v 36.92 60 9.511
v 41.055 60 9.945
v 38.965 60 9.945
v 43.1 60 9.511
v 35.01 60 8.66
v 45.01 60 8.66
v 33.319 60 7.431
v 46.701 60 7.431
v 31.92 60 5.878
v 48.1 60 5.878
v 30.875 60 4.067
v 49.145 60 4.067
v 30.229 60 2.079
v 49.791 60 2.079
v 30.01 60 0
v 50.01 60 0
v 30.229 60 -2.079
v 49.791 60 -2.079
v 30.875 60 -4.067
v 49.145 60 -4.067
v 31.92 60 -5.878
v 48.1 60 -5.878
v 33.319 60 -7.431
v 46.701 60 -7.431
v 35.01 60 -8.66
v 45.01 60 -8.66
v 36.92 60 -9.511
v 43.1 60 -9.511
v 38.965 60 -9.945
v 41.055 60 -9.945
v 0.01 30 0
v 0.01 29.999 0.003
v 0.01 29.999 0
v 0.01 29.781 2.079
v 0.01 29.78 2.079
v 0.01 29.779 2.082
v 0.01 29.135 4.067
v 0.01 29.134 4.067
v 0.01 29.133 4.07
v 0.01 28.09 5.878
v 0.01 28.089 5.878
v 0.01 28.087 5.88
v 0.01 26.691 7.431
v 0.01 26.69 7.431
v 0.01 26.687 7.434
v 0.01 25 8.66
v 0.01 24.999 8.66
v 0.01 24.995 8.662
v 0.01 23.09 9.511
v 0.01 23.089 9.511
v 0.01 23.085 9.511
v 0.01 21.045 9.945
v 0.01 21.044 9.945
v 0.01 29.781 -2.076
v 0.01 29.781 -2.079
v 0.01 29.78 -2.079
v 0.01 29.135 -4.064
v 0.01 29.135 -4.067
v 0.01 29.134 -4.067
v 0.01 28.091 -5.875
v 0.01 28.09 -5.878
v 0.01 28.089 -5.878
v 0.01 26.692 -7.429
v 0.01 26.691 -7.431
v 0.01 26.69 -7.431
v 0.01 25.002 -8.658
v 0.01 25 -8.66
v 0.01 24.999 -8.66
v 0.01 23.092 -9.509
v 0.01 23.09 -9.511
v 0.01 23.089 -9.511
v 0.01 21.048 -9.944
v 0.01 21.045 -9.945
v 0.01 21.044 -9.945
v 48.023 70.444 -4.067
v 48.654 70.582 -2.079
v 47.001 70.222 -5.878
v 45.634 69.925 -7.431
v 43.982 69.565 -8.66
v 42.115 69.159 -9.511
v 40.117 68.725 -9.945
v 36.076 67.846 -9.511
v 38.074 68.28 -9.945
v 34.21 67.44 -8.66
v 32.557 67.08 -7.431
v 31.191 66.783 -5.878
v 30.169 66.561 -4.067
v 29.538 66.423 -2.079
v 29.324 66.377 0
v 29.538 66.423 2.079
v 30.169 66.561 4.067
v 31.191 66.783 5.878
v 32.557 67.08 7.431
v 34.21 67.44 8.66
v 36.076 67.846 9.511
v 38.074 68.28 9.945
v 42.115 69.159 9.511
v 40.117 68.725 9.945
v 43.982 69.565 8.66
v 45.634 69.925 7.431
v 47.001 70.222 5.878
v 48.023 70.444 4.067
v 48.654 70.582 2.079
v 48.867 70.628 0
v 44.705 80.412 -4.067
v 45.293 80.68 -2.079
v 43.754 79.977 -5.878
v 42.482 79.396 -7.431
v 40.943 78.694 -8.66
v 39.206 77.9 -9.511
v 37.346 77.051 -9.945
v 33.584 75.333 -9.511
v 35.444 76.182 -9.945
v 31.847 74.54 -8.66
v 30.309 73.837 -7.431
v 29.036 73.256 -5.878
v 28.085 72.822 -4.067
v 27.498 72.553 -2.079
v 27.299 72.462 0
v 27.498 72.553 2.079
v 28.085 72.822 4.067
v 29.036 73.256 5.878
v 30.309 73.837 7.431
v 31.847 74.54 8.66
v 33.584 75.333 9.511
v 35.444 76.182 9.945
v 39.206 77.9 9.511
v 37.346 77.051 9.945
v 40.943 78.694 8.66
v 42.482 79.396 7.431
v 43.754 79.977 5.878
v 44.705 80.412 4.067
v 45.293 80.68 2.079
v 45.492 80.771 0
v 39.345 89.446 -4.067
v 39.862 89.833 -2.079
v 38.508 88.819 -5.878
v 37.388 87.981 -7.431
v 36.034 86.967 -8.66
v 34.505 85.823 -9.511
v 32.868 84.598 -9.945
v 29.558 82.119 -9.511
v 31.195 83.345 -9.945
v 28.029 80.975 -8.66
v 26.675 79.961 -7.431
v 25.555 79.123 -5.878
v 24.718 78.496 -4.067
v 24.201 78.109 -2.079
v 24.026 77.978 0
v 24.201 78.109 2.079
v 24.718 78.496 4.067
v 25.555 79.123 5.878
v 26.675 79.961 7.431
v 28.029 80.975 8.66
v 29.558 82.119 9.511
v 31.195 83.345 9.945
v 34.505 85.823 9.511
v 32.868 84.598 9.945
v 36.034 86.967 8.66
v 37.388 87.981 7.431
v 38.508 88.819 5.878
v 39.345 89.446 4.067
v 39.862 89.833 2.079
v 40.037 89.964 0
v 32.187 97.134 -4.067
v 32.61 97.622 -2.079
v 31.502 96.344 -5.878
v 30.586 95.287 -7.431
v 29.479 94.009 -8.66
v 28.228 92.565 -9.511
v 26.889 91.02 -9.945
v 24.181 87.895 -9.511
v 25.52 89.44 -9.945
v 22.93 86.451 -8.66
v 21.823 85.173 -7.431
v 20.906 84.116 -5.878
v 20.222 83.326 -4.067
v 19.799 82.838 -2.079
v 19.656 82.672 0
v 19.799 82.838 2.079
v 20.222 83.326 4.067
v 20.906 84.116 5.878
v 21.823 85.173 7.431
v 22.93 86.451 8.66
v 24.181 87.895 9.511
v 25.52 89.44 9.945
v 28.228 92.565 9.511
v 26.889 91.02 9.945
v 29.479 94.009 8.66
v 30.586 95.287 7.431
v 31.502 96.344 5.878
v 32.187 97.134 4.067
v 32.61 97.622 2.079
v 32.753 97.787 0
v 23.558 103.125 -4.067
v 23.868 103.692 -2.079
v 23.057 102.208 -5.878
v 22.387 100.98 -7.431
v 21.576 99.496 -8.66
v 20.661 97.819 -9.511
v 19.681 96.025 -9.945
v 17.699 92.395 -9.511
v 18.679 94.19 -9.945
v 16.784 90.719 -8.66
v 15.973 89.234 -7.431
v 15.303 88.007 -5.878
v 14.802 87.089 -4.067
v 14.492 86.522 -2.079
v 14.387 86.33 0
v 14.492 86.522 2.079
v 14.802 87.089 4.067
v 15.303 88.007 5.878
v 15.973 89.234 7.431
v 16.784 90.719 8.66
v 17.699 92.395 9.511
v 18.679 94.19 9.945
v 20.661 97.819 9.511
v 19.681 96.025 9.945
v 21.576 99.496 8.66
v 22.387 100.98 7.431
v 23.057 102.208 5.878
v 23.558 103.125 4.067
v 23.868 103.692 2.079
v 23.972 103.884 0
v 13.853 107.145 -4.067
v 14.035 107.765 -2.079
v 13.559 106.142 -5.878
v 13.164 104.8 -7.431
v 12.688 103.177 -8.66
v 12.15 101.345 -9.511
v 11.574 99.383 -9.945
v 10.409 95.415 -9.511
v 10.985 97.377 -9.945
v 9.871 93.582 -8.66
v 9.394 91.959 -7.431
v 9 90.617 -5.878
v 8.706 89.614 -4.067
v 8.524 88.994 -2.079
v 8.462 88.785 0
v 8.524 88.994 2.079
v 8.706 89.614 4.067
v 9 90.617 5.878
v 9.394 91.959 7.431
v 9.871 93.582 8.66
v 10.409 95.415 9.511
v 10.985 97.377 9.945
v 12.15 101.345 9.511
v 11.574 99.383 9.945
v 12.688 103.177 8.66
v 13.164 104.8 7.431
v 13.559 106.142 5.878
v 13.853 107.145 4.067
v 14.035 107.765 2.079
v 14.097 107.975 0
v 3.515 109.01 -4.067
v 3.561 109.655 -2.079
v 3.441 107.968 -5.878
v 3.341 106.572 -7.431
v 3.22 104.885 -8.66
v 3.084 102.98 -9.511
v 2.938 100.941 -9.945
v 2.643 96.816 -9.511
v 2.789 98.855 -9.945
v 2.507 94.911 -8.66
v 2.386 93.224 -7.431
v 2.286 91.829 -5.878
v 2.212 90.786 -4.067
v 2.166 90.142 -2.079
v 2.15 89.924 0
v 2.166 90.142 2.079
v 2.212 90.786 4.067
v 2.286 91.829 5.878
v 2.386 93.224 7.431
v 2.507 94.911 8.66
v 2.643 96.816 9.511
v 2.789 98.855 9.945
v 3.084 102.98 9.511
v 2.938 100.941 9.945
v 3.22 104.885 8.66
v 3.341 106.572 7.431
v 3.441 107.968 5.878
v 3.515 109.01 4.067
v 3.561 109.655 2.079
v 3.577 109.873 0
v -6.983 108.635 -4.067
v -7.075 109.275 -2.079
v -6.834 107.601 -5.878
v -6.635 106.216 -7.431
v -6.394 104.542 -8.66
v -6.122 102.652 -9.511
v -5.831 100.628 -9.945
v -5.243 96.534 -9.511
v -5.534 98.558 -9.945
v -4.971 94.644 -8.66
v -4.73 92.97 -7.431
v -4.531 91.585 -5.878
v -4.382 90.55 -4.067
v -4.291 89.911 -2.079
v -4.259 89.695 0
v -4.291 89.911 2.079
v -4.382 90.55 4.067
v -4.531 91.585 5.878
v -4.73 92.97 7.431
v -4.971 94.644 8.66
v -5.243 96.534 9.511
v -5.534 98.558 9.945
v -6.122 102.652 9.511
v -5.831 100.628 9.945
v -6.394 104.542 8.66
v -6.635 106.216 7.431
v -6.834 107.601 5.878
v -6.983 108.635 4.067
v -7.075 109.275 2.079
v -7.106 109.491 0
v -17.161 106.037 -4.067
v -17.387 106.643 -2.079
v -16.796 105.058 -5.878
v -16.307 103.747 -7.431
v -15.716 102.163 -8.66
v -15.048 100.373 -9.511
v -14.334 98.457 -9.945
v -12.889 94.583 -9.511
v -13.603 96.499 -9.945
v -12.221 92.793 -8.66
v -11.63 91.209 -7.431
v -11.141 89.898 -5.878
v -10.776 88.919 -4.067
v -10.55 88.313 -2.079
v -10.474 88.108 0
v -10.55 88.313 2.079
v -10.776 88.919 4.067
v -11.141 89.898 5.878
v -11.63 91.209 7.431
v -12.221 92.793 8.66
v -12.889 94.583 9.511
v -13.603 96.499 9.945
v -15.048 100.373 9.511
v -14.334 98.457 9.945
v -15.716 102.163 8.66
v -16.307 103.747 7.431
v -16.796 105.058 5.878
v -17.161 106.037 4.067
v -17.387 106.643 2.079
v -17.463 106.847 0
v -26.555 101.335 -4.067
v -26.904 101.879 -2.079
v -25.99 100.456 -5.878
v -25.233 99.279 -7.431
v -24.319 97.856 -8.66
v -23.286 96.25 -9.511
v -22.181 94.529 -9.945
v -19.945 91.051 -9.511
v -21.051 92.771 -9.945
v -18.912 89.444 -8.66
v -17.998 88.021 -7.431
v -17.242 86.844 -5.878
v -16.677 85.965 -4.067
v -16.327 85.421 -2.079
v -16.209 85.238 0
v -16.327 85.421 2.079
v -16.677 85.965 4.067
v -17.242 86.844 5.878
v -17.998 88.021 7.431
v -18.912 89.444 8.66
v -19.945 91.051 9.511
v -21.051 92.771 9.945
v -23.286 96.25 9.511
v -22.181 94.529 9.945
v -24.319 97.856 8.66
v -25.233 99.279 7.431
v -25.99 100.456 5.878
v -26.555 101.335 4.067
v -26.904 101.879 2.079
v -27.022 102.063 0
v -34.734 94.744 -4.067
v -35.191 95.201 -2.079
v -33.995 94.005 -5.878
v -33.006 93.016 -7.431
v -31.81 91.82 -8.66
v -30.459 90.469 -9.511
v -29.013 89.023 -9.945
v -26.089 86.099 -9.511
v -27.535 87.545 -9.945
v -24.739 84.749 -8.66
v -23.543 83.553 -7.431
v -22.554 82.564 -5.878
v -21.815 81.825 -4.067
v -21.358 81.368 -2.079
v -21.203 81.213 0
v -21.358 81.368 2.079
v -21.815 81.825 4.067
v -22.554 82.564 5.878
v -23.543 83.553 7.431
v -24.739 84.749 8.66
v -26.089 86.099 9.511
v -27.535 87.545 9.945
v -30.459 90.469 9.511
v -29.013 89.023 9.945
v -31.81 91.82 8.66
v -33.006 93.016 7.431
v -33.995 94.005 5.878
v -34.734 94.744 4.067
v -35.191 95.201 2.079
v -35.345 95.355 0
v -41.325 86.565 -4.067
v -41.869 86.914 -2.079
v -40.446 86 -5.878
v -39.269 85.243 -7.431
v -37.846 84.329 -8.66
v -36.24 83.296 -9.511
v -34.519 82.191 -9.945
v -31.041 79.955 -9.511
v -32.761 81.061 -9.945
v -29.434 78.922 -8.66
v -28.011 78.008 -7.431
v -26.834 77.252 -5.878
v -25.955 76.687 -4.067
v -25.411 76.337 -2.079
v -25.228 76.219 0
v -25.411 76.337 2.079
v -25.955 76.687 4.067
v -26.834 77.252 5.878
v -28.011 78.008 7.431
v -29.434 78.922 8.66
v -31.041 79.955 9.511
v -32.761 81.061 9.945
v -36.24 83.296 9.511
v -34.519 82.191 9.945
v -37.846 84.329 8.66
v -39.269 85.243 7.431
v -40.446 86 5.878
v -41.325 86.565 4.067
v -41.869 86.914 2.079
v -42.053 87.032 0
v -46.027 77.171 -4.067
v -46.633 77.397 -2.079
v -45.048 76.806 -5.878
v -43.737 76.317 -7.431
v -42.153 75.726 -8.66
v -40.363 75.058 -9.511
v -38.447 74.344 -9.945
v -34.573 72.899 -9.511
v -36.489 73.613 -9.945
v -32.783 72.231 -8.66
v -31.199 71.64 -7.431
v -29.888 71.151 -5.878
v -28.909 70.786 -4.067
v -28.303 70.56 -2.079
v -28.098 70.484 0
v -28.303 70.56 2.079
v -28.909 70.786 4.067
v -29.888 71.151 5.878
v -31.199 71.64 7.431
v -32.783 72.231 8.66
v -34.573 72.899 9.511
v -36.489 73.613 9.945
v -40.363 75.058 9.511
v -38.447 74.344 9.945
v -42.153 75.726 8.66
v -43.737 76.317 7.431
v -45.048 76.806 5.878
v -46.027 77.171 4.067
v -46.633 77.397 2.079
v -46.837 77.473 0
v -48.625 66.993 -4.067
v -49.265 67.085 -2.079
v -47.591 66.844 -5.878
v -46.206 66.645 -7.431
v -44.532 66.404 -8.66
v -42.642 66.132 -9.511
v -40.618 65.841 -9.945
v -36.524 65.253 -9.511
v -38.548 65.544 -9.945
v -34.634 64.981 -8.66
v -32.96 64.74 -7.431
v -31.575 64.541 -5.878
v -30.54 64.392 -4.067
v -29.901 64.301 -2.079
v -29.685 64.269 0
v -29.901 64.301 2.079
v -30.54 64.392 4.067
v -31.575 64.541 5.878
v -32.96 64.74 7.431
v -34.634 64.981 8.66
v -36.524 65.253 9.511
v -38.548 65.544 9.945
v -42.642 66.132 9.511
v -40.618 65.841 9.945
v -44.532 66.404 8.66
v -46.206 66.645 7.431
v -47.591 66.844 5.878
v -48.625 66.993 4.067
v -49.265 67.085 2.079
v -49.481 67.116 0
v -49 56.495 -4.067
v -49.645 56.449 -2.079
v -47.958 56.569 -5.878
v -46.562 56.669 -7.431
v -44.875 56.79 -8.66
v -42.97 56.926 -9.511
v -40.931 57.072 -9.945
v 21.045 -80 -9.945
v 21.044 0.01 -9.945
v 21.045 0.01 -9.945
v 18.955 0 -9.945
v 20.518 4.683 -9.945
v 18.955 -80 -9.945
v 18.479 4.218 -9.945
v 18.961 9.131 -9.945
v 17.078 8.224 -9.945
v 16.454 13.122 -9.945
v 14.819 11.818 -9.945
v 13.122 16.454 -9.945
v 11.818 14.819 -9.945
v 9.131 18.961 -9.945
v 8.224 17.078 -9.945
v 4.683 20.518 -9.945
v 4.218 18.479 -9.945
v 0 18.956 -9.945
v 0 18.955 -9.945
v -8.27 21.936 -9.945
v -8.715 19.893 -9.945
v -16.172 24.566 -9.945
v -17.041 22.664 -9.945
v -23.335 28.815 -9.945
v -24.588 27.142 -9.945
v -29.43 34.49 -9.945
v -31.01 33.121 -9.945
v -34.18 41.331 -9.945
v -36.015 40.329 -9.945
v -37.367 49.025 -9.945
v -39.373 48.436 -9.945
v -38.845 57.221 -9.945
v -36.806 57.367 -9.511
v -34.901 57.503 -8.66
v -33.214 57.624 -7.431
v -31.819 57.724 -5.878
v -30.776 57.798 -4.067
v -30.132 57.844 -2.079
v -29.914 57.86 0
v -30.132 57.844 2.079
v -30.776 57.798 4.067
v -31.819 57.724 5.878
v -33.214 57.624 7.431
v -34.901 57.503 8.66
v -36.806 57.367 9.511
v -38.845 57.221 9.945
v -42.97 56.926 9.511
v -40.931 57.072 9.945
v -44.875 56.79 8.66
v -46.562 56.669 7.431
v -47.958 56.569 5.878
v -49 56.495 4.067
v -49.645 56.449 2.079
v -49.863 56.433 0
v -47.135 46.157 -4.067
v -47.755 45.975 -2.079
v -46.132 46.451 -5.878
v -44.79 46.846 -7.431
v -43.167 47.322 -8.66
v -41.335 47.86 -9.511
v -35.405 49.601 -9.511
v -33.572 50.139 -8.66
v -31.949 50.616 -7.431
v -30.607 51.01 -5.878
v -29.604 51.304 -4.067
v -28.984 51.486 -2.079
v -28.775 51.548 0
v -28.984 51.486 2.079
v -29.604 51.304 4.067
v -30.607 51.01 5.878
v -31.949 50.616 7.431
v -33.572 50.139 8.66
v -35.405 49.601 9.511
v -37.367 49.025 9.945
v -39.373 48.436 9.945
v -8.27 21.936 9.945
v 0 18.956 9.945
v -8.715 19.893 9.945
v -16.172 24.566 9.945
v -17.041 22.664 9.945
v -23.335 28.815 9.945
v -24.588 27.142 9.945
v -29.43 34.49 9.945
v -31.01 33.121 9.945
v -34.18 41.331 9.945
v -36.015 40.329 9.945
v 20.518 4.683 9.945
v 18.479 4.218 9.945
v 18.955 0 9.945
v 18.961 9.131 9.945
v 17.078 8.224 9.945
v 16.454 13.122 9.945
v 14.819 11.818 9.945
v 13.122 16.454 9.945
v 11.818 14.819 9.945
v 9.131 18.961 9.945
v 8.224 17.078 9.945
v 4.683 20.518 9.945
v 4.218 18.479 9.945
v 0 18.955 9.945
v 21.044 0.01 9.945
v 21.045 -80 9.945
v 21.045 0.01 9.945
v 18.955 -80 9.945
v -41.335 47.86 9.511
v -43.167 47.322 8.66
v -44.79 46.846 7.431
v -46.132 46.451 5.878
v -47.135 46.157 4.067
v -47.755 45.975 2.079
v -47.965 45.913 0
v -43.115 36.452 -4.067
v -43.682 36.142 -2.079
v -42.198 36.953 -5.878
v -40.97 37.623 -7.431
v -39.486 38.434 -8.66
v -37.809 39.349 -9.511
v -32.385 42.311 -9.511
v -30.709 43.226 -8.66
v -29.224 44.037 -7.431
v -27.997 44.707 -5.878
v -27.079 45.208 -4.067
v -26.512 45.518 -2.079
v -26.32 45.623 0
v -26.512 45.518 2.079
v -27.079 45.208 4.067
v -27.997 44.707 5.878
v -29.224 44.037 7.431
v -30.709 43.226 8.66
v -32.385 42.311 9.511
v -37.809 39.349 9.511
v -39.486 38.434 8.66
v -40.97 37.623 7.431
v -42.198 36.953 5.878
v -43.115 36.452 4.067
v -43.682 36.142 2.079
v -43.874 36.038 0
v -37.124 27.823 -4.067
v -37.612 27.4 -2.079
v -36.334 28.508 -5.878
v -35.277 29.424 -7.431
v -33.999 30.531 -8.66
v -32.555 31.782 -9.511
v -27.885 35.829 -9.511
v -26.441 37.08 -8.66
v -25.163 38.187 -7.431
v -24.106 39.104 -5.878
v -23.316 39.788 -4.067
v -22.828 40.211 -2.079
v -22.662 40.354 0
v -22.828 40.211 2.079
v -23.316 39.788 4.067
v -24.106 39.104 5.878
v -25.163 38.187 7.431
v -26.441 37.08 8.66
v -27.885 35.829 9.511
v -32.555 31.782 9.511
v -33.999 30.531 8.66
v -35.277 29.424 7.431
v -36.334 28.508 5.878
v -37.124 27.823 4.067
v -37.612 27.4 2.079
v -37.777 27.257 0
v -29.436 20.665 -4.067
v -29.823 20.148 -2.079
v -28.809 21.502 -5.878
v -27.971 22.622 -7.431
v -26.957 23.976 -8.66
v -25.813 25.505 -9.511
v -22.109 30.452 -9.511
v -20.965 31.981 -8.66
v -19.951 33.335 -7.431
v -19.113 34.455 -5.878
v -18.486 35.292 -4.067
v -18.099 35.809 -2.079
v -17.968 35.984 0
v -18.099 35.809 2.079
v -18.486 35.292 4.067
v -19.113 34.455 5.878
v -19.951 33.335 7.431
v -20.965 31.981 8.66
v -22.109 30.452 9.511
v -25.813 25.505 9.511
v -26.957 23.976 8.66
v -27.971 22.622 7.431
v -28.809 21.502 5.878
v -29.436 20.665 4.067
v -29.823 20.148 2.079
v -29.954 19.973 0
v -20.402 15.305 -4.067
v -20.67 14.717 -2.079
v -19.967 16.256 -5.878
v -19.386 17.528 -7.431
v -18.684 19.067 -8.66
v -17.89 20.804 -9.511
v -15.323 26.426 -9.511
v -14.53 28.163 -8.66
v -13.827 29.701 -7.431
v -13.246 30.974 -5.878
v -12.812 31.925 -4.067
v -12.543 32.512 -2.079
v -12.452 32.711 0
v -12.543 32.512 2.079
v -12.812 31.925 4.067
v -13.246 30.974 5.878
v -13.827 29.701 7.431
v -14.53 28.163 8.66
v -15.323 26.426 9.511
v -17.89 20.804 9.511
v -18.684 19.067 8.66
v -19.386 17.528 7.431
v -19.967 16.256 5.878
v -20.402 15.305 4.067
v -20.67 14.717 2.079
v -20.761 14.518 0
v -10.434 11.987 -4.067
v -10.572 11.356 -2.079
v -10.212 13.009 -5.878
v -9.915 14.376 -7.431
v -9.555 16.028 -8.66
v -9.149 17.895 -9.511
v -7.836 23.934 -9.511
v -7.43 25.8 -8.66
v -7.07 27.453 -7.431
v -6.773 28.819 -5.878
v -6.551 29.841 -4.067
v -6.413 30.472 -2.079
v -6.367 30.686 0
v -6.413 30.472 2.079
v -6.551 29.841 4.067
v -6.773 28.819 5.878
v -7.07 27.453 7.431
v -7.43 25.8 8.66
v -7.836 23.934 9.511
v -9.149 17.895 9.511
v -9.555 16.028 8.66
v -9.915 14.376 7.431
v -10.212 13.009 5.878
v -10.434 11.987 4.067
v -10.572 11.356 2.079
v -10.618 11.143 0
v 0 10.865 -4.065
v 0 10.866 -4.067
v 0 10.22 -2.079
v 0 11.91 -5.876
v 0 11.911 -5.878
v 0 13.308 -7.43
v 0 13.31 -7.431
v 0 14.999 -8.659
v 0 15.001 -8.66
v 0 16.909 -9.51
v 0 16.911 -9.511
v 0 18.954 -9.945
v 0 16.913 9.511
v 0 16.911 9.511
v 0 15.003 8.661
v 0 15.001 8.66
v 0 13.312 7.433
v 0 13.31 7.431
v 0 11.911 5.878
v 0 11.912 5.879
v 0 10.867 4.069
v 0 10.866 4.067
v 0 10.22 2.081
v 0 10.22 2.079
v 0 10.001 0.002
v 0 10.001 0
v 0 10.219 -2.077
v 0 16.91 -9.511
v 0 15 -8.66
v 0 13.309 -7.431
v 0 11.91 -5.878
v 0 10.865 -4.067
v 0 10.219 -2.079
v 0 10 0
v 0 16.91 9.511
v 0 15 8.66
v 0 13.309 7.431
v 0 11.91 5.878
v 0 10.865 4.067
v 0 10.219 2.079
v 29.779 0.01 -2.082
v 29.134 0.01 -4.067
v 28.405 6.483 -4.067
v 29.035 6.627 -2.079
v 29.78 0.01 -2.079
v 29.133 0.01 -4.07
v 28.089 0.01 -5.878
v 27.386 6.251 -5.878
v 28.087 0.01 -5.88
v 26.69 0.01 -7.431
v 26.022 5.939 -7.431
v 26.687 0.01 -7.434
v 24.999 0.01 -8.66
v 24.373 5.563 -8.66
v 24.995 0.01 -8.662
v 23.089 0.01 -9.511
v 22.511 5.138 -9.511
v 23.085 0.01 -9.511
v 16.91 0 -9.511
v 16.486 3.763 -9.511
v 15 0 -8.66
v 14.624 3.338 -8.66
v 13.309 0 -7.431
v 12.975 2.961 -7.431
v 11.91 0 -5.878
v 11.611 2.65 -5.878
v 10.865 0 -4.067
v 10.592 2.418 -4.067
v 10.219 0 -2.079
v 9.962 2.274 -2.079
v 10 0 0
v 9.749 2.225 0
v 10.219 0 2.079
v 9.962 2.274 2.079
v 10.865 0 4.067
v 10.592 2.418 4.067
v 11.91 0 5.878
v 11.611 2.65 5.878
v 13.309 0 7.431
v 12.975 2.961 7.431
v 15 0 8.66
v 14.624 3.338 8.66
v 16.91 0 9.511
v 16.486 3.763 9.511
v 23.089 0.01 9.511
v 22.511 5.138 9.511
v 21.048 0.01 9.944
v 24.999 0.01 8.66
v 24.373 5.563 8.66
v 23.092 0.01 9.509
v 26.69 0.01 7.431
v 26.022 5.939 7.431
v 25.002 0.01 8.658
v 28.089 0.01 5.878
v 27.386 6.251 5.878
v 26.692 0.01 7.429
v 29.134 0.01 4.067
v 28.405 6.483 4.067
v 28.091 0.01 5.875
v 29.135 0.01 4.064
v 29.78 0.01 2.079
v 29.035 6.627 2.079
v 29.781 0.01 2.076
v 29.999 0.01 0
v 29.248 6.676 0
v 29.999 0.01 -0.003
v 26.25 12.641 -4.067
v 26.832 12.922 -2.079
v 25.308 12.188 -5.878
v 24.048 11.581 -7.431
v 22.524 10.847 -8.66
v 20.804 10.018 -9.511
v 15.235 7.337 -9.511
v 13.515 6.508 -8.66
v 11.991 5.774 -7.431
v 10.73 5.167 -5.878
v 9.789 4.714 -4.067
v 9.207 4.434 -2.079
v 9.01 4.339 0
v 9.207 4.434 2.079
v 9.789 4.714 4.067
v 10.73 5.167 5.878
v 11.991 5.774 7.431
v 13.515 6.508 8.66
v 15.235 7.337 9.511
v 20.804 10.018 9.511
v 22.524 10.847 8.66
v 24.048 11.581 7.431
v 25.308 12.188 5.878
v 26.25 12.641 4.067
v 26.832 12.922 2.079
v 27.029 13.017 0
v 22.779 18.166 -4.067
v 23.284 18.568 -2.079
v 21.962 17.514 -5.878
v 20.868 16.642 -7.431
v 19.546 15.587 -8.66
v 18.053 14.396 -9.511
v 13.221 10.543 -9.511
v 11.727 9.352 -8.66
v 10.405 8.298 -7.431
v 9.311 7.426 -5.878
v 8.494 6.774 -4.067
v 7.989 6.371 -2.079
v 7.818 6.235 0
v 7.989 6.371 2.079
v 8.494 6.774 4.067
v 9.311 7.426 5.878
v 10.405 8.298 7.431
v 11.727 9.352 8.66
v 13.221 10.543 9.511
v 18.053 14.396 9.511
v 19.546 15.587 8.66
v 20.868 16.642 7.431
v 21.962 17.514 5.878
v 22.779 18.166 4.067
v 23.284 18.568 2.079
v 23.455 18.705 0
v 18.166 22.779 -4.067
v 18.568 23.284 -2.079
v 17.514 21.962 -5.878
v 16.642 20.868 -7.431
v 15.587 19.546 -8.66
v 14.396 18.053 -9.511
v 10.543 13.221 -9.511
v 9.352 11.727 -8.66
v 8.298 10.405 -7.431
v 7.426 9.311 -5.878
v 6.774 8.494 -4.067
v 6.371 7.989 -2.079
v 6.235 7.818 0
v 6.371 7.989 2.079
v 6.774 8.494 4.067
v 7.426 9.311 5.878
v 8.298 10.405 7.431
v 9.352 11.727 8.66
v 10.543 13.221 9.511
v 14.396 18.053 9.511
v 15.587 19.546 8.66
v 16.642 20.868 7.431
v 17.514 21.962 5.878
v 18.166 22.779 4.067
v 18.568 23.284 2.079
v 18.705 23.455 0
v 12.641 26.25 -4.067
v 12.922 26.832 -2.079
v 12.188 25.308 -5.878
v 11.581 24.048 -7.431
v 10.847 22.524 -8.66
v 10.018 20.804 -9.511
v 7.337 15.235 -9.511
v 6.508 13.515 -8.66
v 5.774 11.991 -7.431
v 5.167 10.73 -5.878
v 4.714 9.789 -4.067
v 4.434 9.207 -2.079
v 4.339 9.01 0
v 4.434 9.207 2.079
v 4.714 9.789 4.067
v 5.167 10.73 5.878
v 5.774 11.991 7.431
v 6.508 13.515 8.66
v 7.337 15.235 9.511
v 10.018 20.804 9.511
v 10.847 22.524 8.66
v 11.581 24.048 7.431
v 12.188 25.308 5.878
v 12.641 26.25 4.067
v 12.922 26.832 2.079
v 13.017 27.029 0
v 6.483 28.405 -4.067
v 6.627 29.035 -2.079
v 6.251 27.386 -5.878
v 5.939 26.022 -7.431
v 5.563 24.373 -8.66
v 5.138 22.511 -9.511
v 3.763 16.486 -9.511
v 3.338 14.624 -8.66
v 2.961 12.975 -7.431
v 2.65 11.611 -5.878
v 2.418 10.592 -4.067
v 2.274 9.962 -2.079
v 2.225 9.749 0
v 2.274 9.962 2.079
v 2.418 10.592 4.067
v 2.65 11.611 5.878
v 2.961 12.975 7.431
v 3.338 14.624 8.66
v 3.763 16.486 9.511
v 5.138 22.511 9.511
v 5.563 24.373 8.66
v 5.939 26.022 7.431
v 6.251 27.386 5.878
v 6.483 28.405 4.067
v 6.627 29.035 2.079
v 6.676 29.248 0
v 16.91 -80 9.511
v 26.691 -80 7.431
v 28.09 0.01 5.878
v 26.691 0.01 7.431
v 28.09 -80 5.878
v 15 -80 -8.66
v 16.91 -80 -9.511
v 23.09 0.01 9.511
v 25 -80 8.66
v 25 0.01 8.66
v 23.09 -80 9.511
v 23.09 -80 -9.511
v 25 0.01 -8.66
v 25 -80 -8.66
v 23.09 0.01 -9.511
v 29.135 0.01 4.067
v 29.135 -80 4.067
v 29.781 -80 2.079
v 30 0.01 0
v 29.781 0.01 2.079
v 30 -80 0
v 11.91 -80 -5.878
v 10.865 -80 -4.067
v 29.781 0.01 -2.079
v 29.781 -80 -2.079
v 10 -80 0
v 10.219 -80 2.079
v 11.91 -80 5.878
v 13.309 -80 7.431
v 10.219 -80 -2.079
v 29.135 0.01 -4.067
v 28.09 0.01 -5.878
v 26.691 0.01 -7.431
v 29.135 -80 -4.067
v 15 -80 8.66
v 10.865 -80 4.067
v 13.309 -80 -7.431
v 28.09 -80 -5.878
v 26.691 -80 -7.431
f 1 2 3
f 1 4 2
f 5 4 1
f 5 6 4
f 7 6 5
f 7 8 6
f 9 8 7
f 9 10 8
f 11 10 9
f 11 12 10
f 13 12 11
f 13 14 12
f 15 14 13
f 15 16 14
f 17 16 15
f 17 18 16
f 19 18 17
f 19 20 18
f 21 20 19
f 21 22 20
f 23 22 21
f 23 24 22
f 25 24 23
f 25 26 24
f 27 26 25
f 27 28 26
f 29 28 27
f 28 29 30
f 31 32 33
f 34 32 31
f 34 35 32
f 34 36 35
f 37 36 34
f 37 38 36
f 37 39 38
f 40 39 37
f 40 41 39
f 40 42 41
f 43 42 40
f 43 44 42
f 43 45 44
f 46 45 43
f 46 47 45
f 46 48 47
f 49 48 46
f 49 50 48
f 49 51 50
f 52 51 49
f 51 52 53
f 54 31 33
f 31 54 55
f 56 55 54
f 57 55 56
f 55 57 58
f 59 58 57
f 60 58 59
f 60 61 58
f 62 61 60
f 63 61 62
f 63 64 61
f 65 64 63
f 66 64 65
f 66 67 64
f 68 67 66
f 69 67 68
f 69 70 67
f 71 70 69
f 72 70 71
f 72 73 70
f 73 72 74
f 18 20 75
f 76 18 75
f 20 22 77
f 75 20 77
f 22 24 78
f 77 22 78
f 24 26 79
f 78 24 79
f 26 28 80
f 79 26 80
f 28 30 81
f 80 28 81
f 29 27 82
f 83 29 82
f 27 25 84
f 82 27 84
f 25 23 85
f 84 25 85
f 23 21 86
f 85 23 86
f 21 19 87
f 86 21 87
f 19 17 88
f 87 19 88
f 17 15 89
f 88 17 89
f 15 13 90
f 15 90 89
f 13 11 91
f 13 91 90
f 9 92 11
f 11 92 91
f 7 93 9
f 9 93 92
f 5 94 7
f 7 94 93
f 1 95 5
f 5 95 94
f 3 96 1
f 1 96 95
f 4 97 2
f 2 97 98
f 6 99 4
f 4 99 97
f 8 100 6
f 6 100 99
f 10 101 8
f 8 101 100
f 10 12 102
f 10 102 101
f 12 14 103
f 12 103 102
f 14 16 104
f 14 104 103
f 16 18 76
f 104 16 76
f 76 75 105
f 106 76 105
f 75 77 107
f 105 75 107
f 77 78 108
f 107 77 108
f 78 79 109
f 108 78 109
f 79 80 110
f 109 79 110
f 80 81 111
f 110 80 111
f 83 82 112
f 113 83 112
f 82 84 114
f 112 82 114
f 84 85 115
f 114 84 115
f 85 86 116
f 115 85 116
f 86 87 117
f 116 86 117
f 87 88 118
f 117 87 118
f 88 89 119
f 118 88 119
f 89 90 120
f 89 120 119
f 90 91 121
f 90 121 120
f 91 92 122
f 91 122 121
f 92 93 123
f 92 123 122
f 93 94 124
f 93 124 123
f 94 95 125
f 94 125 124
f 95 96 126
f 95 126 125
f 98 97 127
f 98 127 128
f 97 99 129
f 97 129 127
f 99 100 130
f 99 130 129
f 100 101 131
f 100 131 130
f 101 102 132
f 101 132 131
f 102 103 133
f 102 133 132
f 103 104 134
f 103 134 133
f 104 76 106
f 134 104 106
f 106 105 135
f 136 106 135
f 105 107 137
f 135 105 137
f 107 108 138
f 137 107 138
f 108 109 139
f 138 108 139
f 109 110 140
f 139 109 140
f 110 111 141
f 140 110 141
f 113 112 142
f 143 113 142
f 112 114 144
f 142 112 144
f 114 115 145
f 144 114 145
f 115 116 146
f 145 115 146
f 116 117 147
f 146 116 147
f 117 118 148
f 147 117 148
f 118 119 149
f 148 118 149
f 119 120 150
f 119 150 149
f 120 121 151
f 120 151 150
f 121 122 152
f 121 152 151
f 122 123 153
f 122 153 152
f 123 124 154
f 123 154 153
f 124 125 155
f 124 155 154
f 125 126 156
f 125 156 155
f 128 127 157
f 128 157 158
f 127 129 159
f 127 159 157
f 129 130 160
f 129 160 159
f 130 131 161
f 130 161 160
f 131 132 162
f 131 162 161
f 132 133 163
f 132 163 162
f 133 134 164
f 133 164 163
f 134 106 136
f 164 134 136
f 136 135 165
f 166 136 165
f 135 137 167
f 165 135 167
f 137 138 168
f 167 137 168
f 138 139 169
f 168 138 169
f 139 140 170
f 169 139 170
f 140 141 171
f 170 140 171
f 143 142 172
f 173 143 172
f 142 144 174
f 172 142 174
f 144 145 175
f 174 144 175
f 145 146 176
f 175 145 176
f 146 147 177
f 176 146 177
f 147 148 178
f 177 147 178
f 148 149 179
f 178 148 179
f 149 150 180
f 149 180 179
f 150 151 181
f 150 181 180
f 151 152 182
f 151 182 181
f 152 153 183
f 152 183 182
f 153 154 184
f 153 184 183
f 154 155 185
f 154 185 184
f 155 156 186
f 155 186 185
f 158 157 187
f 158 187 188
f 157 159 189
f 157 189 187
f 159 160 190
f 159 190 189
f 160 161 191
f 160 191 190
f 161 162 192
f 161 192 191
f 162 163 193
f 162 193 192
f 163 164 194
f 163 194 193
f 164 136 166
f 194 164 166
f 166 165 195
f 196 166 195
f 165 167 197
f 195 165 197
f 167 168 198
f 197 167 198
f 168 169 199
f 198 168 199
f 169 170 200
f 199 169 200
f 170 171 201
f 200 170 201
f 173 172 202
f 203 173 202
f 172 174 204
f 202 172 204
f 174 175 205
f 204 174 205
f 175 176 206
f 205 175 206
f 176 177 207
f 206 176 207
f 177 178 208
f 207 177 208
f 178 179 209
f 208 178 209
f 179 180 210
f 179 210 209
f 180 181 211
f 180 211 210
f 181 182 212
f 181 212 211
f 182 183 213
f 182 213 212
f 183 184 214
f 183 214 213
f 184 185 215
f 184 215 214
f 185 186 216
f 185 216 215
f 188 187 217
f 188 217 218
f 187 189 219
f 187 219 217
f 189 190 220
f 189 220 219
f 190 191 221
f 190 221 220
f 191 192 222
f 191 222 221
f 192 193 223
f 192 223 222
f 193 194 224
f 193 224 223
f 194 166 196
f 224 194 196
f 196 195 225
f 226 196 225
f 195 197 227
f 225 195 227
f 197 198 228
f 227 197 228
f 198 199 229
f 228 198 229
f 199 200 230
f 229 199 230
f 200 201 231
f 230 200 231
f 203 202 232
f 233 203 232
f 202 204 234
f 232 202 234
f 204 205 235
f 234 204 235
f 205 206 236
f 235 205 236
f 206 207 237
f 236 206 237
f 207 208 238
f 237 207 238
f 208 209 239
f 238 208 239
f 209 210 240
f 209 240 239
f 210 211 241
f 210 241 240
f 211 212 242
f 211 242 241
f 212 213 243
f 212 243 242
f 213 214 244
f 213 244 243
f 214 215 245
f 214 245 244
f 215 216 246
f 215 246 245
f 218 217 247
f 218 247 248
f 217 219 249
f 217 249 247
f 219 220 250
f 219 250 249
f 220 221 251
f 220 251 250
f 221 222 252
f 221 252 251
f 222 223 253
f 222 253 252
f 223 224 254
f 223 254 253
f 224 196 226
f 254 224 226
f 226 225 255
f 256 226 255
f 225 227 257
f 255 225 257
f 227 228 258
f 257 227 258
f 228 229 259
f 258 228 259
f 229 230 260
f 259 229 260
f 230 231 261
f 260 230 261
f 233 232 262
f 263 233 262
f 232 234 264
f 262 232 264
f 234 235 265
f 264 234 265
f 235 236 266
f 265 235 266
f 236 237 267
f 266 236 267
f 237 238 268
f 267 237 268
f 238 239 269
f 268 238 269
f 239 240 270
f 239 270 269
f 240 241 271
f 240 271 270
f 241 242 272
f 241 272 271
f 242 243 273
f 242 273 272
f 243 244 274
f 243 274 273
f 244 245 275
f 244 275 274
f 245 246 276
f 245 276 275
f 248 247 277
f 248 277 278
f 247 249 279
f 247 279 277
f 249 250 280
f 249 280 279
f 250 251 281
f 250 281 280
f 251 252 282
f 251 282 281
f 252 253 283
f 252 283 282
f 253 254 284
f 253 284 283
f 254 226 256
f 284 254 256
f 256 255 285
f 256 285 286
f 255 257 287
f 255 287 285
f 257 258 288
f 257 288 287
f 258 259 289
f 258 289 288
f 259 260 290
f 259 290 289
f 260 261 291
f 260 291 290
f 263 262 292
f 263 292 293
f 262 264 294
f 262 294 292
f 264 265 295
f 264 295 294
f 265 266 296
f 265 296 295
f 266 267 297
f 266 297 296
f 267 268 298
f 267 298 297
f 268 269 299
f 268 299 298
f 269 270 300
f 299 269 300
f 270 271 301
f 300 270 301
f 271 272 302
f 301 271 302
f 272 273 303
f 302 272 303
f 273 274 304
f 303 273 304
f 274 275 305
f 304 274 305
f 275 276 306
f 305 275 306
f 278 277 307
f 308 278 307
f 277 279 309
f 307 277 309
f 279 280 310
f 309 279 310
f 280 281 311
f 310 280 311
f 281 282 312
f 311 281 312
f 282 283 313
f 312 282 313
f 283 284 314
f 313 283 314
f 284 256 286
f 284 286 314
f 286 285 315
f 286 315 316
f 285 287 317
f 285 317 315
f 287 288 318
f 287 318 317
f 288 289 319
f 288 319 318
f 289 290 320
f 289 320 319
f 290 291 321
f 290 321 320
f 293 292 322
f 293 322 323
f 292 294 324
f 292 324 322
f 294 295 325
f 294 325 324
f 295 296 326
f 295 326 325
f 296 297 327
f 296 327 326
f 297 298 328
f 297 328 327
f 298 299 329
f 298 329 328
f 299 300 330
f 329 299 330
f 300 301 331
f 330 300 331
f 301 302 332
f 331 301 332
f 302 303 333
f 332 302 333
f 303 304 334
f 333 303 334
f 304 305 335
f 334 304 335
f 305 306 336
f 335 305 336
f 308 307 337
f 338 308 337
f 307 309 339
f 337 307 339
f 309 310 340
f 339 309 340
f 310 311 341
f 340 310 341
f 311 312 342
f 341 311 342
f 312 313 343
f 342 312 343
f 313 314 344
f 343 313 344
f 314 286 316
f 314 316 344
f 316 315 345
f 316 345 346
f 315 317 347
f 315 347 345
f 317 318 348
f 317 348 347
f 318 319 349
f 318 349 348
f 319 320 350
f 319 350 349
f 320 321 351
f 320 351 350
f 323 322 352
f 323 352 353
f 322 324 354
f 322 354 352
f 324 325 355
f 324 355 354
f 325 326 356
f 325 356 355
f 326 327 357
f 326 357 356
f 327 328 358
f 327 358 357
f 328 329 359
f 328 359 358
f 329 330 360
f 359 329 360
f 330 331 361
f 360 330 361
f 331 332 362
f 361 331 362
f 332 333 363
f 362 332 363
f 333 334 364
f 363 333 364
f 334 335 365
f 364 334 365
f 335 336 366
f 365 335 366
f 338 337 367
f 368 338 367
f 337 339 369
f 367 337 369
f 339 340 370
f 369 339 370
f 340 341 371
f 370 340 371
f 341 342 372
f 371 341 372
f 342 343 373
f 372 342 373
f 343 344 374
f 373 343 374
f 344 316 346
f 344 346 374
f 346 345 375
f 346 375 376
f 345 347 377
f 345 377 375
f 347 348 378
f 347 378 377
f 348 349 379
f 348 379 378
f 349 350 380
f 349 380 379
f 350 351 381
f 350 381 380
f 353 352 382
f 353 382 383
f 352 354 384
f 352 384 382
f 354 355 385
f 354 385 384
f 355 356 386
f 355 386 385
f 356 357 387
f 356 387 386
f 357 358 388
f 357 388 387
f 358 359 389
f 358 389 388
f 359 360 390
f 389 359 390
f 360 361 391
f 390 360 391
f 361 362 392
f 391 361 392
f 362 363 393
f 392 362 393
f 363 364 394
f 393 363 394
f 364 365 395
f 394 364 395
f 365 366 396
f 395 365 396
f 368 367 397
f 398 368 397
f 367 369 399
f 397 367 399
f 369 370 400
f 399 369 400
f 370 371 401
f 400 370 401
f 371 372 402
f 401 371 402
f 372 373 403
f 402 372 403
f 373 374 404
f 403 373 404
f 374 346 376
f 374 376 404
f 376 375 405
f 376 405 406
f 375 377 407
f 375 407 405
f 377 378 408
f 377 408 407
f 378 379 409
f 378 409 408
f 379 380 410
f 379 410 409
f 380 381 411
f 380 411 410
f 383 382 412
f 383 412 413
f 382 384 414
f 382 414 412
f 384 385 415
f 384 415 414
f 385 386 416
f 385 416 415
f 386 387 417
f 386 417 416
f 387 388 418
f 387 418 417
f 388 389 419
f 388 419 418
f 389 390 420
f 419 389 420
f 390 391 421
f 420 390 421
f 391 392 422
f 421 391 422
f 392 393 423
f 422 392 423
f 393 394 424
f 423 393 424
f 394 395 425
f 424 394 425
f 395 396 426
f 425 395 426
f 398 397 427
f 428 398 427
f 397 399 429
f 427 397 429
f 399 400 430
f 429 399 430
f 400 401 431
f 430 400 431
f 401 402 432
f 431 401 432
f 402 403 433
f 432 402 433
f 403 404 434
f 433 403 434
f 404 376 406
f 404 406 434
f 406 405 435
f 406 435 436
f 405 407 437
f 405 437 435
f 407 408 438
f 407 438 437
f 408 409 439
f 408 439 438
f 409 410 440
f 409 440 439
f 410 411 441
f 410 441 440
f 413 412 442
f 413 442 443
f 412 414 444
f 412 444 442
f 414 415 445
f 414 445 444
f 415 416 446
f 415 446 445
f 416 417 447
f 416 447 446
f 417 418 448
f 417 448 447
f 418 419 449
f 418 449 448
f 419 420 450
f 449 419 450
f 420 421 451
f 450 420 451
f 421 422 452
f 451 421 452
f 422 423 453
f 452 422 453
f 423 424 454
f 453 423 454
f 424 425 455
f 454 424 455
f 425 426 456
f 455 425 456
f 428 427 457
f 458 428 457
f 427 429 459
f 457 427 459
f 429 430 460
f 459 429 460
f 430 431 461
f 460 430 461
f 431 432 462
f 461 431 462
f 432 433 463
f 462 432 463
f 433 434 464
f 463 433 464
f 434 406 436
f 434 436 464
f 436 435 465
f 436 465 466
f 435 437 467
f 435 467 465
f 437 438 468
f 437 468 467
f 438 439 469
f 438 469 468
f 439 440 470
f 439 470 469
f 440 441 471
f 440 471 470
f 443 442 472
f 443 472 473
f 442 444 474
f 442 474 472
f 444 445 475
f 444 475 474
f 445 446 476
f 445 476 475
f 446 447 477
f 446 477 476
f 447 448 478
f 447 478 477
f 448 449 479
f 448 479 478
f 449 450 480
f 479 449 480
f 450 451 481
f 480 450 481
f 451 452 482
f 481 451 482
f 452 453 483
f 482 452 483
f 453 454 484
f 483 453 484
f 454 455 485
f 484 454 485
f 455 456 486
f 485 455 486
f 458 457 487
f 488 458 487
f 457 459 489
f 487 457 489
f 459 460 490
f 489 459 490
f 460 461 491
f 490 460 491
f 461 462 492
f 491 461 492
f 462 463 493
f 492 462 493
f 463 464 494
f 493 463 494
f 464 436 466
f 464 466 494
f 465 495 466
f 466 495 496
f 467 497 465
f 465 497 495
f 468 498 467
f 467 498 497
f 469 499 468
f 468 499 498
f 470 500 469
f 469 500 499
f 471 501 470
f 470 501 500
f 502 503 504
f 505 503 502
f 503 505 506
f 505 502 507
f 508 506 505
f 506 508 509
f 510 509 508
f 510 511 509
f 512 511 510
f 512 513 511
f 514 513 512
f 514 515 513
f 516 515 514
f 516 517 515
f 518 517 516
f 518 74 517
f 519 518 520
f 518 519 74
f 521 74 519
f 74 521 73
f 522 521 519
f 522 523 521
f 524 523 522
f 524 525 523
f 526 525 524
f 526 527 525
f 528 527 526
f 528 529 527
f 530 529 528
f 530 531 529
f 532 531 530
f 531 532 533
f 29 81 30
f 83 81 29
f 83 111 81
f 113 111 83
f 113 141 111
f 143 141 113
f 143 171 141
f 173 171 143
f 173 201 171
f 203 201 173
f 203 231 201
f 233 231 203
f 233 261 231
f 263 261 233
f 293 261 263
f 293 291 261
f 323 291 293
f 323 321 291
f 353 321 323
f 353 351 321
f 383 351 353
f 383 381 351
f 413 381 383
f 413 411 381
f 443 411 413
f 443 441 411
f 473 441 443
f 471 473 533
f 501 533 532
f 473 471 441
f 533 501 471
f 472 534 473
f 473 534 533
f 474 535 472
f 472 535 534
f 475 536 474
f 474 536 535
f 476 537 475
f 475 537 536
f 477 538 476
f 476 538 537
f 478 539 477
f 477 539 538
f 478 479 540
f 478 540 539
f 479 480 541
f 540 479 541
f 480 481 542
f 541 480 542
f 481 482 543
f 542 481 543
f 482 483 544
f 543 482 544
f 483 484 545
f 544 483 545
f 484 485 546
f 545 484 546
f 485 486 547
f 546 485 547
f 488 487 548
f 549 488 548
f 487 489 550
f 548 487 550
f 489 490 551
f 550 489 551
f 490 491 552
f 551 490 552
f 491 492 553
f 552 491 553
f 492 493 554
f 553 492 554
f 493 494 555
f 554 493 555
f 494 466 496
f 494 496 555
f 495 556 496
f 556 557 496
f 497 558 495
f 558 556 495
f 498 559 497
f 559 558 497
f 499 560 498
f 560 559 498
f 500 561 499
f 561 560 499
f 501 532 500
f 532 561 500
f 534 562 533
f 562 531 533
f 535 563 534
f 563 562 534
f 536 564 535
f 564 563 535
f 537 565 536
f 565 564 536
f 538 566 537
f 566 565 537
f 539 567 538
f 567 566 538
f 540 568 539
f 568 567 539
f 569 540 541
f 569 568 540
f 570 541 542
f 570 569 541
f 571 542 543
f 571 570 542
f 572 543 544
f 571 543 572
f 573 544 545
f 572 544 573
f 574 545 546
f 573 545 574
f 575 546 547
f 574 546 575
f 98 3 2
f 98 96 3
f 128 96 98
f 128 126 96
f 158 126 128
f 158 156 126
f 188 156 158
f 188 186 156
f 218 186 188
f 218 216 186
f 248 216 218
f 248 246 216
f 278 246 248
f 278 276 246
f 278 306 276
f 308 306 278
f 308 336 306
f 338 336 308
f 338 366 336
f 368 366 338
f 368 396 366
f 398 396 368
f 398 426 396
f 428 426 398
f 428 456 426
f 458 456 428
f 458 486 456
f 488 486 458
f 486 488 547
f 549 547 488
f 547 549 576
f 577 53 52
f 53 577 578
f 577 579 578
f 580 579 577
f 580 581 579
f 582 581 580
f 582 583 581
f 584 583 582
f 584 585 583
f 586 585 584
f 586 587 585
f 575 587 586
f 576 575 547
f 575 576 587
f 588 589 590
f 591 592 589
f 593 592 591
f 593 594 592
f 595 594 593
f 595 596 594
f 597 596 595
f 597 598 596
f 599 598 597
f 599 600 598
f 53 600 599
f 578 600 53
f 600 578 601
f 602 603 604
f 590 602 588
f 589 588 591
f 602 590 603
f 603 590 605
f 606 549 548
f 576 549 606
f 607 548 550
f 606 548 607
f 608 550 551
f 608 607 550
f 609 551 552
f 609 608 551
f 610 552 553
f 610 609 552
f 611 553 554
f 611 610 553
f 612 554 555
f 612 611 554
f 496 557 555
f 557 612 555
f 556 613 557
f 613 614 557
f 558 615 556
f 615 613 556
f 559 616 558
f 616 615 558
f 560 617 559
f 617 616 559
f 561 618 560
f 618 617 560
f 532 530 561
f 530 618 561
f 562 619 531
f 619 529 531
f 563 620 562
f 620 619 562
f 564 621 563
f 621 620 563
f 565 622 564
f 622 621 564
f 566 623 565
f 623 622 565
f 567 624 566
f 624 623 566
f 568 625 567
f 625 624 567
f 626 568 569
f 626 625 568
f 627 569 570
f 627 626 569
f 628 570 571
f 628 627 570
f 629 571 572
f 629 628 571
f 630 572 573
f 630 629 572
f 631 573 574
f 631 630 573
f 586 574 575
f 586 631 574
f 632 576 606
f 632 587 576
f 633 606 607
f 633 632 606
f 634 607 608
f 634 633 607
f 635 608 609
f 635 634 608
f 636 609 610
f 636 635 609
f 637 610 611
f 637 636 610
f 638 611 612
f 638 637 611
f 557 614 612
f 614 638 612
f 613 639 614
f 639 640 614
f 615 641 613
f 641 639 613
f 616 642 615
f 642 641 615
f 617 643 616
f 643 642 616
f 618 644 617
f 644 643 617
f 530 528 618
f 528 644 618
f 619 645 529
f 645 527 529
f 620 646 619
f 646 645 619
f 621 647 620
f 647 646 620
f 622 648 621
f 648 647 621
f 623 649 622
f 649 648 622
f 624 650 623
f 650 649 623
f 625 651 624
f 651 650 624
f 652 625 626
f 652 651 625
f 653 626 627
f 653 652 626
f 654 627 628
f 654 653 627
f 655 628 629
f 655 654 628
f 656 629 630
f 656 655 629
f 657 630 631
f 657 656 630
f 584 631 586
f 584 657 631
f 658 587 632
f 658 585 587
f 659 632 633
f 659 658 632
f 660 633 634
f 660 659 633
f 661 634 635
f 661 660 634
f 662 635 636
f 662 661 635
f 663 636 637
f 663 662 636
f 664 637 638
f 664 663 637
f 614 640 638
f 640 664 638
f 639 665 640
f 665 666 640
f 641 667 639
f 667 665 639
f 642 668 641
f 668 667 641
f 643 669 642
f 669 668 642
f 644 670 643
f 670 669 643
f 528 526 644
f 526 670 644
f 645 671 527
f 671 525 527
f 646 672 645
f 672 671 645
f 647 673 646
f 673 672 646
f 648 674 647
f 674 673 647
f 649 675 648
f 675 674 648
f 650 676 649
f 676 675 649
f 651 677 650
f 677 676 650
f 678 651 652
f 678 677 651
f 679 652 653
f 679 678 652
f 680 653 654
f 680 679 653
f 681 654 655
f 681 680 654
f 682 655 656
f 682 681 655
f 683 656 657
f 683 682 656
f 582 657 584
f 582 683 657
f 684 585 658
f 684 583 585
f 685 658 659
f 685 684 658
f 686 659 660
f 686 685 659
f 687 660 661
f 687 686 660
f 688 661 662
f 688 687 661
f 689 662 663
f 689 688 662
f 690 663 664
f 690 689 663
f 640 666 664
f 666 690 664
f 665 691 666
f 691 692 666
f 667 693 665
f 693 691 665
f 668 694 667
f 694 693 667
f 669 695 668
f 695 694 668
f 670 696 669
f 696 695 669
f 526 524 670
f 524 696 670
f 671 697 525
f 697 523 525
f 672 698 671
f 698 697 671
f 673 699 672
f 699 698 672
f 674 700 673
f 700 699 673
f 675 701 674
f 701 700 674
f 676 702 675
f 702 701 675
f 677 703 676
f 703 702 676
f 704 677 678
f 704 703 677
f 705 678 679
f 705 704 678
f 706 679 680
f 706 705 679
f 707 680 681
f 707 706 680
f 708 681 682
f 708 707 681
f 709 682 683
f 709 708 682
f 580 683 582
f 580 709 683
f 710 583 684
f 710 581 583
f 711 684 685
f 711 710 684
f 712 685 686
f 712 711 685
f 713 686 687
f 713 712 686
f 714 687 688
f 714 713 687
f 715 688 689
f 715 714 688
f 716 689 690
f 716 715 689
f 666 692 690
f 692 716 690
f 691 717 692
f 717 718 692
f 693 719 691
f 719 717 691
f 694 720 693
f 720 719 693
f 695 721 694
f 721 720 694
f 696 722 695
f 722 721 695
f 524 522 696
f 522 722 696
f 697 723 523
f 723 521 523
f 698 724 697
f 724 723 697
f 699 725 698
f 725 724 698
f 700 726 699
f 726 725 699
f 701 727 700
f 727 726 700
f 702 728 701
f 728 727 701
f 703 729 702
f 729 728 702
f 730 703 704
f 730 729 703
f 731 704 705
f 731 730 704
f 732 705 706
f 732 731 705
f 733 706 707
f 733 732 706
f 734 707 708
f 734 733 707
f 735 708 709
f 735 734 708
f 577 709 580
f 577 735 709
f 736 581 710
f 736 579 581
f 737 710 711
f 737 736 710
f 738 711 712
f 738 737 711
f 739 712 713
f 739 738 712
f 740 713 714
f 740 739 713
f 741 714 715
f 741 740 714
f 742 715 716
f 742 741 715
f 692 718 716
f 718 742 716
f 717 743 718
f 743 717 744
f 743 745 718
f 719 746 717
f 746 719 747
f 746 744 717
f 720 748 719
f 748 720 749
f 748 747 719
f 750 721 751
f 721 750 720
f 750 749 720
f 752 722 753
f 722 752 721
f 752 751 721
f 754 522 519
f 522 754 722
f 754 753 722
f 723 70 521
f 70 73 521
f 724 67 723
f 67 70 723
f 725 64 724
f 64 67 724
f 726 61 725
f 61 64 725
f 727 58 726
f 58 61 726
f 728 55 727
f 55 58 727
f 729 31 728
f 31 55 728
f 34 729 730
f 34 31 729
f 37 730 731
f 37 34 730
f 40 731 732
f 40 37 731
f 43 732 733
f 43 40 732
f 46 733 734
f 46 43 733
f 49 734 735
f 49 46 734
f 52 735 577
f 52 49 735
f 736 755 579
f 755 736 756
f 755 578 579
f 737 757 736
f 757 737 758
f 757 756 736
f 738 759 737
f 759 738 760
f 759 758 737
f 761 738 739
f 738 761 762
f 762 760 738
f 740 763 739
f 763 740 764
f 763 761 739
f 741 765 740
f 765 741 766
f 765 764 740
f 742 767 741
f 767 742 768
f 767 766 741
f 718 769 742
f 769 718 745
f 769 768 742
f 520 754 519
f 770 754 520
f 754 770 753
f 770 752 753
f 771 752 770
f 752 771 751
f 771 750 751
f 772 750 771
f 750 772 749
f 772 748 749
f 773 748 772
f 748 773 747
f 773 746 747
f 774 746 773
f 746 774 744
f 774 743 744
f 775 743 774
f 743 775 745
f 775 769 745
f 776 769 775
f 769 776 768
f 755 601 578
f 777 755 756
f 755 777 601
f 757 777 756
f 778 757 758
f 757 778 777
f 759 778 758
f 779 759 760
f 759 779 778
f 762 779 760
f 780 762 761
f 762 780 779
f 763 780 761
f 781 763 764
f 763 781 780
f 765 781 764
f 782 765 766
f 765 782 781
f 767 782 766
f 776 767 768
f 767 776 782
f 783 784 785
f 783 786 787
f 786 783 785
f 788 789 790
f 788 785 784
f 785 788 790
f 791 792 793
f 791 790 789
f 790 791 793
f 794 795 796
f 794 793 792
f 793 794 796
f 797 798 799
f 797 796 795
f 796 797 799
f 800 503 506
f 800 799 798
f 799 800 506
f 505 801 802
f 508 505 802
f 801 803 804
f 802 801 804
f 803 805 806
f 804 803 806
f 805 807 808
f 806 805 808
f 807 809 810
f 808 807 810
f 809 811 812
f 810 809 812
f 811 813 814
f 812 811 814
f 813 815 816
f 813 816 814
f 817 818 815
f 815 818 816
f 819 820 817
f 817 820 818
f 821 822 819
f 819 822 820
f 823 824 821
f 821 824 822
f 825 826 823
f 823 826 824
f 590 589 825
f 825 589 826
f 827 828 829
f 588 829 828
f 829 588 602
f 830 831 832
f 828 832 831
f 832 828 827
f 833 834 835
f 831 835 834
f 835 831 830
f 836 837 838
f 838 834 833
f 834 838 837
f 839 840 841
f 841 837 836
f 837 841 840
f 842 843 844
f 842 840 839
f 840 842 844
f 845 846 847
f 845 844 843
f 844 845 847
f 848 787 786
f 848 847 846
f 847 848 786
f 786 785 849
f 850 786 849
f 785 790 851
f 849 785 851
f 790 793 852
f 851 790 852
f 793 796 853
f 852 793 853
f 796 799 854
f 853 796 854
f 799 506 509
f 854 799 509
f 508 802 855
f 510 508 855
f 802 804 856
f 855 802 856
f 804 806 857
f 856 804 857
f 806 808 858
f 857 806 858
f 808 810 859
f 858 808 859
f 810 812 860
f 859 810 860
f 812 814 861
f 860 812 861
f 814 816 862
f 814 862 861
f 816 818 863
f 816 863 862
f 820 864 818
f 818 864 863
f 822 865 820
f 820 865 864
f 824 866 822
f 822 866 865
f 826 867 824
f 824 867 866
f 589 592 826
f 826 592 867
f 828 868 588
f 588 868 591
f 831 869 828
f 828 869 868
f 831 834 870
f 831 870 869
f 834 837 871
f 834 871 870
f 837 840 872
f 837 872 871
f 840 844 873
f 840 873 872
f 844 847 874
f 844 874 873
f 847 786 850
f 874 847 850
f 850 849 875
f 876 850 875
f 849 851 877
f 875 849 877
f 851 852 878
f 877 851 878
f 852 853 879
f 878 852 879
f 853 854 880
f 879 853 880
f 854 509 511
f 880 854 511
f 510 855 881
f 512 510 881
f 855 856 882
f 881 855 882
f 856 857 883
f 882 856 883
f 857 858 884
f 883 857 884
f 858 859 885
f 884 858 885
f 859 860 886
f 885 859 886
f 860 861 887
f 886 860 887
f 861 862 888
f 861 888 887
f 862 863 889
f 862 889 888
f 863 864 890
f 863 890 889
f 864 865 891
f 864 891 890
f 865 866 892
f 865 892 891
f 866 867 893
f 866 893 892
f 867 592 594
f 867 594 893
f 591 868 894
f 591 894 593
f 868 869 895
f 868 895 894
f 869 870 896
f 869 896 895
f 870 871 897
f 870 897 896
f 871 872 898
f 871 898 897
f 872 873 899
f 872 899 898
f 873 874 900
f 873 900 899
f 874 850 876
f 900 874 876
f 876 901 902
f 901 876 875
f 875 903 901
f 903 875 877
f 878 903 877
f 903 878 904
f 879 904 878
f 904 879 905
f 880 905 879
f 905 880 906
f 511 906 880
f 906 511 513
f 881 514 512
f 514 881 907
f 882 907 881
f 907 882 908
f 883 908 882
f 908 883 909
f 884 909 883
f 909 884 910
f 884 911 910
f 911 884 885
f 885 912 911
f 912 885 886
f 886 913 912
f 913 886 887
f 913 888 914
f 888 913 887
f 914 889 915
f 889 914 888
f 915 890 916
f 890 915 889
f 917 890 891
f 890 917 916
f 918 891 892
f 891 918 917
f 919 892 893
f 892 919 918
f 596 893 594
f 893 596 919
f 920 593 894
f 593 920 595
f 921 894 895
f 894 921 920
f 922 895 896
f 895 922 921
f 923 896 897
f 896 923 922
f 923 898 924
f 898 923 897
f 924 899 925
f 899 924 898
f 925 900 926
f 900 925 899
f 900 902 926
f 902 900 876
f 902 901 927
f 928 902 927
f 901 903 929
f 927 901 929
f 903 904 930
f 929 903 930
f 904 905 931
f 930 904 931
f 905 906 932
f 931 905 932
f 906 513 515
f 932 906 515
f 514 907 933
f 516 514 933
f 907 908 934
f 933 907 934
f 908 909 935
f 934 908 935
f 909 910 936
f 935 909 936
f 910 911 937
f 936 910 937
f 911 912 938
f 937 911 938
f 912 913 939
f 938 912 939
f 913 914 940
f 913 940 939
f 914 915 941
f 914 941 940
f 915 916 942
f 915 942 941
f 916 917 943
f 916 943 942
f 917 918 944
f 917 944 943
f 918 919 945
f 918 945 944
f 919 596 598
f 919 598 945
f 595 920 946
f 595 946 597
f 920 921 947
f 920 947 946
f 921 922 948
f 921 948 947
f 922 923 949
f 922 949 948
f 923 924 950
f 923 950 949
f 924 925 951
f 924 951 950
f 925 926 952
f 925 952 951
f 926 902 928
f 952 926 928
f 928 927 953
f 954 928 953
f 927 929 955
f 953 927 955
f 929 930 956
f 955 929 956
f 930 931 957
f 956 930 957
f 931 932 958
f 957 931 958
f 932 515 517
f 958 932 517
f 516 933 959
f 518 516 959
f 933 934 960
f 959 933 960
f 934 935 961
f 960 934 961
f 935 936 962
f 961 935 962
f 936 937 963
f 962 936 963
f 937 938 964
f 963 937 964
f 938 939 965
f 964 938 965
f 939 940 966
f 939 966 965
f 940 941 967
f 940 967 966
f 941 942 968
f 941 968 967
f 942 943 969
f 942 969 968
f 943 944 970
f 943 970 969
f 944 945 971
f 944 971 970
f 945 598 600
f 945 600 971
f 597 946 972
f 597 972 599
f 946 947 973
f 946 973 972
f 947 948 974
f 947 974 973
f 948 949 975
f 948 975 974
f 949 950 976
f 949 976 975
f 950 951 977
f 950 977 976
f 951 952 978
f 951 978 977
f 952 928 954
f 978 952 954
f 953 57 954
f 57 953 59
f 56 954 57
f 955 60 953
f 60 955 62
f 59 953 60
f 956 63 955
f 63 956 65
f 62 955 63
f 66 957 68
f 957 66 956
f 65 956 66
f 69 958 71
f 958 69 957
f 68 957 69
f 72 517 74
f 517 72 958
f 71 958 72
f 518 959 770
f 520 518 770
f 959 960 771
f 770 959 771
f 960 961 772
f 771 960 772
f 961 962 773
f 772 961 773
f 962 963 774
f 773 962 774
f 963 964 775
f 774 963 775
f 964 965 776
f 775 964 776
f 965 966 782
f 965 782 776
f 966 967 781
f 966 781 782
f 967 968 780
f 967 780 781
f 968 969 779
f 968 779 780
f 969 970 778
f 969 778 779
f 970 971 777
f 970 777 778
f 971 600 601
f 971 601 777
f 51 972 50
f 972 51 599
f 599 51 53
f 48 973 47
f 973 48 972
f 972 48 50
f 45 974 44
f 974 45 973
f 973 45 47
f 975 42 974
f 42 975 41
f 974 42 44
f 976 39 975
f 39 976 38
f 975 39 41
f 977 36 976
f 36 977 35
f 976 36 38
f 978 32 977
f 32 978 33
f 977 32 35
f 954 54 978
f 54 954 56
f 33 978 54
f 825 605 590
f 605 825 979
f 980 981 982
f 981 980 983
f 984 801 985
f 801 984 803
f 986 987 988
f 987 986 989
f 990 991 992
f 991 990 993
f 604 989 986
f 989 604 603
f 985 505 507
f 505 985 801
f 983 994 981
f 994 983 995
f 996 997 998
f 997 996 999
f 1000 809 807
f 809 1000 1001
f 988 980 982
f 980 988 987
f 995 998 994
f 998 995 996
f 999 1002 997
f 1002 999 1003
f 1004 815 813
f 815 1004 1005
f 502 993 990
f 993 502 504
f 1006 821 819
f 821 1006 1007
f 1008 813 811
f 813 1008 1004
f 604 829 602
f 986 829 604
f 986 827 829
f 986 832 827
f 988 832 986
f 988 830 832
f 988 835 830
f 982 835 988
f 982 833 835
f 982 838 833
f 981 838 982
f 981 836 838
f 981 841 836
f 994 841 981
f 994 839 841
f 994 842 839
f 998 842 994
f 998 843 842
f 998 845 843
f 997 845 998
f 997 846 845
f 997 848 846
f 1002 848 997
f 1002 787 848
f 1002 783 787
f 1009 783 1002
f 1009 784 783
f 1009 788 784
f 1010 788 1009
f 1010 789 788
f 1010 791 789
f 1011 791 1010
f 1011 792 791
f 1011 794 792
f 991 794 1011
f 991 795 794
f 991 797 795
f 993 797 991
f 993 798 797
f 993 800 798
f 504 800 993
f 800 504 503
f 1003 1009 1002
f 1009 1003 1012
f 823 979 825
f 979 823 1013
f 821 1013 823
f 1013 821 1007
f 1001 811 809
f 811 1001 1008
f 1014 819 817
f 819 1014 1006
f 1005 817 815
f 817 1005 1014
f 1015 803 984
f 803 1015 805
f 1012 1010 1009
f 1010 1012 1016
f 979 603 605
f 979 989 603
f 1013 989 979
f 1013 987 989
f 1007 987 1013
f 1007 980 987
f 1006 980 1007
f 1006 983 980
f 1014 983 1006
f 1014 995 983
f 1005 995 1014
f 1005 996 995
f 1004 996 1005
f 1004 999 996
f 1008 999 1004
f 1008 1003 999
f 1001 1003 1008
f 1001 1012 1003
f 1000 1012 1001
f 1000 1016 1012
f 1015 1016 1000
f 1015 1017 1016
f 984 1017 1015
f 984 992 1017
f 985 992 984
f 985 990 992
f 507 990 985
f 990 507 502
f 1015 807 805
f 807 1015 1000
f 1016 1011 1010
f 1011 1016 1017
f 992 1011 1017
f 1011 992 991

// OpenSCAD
translate([0.01, 60,0])
    rotate_extrude(angle=270, convexity = 10)
    translate([40,0]) circle(10);
    
    rotate_extrude(angle=90, convexity = 10)
    translate([20,0]) circle(10);
    
    translate([20,0.01, 0])
    rotate([90,0,0]) cylinder(r=10,h=80+0.01);
